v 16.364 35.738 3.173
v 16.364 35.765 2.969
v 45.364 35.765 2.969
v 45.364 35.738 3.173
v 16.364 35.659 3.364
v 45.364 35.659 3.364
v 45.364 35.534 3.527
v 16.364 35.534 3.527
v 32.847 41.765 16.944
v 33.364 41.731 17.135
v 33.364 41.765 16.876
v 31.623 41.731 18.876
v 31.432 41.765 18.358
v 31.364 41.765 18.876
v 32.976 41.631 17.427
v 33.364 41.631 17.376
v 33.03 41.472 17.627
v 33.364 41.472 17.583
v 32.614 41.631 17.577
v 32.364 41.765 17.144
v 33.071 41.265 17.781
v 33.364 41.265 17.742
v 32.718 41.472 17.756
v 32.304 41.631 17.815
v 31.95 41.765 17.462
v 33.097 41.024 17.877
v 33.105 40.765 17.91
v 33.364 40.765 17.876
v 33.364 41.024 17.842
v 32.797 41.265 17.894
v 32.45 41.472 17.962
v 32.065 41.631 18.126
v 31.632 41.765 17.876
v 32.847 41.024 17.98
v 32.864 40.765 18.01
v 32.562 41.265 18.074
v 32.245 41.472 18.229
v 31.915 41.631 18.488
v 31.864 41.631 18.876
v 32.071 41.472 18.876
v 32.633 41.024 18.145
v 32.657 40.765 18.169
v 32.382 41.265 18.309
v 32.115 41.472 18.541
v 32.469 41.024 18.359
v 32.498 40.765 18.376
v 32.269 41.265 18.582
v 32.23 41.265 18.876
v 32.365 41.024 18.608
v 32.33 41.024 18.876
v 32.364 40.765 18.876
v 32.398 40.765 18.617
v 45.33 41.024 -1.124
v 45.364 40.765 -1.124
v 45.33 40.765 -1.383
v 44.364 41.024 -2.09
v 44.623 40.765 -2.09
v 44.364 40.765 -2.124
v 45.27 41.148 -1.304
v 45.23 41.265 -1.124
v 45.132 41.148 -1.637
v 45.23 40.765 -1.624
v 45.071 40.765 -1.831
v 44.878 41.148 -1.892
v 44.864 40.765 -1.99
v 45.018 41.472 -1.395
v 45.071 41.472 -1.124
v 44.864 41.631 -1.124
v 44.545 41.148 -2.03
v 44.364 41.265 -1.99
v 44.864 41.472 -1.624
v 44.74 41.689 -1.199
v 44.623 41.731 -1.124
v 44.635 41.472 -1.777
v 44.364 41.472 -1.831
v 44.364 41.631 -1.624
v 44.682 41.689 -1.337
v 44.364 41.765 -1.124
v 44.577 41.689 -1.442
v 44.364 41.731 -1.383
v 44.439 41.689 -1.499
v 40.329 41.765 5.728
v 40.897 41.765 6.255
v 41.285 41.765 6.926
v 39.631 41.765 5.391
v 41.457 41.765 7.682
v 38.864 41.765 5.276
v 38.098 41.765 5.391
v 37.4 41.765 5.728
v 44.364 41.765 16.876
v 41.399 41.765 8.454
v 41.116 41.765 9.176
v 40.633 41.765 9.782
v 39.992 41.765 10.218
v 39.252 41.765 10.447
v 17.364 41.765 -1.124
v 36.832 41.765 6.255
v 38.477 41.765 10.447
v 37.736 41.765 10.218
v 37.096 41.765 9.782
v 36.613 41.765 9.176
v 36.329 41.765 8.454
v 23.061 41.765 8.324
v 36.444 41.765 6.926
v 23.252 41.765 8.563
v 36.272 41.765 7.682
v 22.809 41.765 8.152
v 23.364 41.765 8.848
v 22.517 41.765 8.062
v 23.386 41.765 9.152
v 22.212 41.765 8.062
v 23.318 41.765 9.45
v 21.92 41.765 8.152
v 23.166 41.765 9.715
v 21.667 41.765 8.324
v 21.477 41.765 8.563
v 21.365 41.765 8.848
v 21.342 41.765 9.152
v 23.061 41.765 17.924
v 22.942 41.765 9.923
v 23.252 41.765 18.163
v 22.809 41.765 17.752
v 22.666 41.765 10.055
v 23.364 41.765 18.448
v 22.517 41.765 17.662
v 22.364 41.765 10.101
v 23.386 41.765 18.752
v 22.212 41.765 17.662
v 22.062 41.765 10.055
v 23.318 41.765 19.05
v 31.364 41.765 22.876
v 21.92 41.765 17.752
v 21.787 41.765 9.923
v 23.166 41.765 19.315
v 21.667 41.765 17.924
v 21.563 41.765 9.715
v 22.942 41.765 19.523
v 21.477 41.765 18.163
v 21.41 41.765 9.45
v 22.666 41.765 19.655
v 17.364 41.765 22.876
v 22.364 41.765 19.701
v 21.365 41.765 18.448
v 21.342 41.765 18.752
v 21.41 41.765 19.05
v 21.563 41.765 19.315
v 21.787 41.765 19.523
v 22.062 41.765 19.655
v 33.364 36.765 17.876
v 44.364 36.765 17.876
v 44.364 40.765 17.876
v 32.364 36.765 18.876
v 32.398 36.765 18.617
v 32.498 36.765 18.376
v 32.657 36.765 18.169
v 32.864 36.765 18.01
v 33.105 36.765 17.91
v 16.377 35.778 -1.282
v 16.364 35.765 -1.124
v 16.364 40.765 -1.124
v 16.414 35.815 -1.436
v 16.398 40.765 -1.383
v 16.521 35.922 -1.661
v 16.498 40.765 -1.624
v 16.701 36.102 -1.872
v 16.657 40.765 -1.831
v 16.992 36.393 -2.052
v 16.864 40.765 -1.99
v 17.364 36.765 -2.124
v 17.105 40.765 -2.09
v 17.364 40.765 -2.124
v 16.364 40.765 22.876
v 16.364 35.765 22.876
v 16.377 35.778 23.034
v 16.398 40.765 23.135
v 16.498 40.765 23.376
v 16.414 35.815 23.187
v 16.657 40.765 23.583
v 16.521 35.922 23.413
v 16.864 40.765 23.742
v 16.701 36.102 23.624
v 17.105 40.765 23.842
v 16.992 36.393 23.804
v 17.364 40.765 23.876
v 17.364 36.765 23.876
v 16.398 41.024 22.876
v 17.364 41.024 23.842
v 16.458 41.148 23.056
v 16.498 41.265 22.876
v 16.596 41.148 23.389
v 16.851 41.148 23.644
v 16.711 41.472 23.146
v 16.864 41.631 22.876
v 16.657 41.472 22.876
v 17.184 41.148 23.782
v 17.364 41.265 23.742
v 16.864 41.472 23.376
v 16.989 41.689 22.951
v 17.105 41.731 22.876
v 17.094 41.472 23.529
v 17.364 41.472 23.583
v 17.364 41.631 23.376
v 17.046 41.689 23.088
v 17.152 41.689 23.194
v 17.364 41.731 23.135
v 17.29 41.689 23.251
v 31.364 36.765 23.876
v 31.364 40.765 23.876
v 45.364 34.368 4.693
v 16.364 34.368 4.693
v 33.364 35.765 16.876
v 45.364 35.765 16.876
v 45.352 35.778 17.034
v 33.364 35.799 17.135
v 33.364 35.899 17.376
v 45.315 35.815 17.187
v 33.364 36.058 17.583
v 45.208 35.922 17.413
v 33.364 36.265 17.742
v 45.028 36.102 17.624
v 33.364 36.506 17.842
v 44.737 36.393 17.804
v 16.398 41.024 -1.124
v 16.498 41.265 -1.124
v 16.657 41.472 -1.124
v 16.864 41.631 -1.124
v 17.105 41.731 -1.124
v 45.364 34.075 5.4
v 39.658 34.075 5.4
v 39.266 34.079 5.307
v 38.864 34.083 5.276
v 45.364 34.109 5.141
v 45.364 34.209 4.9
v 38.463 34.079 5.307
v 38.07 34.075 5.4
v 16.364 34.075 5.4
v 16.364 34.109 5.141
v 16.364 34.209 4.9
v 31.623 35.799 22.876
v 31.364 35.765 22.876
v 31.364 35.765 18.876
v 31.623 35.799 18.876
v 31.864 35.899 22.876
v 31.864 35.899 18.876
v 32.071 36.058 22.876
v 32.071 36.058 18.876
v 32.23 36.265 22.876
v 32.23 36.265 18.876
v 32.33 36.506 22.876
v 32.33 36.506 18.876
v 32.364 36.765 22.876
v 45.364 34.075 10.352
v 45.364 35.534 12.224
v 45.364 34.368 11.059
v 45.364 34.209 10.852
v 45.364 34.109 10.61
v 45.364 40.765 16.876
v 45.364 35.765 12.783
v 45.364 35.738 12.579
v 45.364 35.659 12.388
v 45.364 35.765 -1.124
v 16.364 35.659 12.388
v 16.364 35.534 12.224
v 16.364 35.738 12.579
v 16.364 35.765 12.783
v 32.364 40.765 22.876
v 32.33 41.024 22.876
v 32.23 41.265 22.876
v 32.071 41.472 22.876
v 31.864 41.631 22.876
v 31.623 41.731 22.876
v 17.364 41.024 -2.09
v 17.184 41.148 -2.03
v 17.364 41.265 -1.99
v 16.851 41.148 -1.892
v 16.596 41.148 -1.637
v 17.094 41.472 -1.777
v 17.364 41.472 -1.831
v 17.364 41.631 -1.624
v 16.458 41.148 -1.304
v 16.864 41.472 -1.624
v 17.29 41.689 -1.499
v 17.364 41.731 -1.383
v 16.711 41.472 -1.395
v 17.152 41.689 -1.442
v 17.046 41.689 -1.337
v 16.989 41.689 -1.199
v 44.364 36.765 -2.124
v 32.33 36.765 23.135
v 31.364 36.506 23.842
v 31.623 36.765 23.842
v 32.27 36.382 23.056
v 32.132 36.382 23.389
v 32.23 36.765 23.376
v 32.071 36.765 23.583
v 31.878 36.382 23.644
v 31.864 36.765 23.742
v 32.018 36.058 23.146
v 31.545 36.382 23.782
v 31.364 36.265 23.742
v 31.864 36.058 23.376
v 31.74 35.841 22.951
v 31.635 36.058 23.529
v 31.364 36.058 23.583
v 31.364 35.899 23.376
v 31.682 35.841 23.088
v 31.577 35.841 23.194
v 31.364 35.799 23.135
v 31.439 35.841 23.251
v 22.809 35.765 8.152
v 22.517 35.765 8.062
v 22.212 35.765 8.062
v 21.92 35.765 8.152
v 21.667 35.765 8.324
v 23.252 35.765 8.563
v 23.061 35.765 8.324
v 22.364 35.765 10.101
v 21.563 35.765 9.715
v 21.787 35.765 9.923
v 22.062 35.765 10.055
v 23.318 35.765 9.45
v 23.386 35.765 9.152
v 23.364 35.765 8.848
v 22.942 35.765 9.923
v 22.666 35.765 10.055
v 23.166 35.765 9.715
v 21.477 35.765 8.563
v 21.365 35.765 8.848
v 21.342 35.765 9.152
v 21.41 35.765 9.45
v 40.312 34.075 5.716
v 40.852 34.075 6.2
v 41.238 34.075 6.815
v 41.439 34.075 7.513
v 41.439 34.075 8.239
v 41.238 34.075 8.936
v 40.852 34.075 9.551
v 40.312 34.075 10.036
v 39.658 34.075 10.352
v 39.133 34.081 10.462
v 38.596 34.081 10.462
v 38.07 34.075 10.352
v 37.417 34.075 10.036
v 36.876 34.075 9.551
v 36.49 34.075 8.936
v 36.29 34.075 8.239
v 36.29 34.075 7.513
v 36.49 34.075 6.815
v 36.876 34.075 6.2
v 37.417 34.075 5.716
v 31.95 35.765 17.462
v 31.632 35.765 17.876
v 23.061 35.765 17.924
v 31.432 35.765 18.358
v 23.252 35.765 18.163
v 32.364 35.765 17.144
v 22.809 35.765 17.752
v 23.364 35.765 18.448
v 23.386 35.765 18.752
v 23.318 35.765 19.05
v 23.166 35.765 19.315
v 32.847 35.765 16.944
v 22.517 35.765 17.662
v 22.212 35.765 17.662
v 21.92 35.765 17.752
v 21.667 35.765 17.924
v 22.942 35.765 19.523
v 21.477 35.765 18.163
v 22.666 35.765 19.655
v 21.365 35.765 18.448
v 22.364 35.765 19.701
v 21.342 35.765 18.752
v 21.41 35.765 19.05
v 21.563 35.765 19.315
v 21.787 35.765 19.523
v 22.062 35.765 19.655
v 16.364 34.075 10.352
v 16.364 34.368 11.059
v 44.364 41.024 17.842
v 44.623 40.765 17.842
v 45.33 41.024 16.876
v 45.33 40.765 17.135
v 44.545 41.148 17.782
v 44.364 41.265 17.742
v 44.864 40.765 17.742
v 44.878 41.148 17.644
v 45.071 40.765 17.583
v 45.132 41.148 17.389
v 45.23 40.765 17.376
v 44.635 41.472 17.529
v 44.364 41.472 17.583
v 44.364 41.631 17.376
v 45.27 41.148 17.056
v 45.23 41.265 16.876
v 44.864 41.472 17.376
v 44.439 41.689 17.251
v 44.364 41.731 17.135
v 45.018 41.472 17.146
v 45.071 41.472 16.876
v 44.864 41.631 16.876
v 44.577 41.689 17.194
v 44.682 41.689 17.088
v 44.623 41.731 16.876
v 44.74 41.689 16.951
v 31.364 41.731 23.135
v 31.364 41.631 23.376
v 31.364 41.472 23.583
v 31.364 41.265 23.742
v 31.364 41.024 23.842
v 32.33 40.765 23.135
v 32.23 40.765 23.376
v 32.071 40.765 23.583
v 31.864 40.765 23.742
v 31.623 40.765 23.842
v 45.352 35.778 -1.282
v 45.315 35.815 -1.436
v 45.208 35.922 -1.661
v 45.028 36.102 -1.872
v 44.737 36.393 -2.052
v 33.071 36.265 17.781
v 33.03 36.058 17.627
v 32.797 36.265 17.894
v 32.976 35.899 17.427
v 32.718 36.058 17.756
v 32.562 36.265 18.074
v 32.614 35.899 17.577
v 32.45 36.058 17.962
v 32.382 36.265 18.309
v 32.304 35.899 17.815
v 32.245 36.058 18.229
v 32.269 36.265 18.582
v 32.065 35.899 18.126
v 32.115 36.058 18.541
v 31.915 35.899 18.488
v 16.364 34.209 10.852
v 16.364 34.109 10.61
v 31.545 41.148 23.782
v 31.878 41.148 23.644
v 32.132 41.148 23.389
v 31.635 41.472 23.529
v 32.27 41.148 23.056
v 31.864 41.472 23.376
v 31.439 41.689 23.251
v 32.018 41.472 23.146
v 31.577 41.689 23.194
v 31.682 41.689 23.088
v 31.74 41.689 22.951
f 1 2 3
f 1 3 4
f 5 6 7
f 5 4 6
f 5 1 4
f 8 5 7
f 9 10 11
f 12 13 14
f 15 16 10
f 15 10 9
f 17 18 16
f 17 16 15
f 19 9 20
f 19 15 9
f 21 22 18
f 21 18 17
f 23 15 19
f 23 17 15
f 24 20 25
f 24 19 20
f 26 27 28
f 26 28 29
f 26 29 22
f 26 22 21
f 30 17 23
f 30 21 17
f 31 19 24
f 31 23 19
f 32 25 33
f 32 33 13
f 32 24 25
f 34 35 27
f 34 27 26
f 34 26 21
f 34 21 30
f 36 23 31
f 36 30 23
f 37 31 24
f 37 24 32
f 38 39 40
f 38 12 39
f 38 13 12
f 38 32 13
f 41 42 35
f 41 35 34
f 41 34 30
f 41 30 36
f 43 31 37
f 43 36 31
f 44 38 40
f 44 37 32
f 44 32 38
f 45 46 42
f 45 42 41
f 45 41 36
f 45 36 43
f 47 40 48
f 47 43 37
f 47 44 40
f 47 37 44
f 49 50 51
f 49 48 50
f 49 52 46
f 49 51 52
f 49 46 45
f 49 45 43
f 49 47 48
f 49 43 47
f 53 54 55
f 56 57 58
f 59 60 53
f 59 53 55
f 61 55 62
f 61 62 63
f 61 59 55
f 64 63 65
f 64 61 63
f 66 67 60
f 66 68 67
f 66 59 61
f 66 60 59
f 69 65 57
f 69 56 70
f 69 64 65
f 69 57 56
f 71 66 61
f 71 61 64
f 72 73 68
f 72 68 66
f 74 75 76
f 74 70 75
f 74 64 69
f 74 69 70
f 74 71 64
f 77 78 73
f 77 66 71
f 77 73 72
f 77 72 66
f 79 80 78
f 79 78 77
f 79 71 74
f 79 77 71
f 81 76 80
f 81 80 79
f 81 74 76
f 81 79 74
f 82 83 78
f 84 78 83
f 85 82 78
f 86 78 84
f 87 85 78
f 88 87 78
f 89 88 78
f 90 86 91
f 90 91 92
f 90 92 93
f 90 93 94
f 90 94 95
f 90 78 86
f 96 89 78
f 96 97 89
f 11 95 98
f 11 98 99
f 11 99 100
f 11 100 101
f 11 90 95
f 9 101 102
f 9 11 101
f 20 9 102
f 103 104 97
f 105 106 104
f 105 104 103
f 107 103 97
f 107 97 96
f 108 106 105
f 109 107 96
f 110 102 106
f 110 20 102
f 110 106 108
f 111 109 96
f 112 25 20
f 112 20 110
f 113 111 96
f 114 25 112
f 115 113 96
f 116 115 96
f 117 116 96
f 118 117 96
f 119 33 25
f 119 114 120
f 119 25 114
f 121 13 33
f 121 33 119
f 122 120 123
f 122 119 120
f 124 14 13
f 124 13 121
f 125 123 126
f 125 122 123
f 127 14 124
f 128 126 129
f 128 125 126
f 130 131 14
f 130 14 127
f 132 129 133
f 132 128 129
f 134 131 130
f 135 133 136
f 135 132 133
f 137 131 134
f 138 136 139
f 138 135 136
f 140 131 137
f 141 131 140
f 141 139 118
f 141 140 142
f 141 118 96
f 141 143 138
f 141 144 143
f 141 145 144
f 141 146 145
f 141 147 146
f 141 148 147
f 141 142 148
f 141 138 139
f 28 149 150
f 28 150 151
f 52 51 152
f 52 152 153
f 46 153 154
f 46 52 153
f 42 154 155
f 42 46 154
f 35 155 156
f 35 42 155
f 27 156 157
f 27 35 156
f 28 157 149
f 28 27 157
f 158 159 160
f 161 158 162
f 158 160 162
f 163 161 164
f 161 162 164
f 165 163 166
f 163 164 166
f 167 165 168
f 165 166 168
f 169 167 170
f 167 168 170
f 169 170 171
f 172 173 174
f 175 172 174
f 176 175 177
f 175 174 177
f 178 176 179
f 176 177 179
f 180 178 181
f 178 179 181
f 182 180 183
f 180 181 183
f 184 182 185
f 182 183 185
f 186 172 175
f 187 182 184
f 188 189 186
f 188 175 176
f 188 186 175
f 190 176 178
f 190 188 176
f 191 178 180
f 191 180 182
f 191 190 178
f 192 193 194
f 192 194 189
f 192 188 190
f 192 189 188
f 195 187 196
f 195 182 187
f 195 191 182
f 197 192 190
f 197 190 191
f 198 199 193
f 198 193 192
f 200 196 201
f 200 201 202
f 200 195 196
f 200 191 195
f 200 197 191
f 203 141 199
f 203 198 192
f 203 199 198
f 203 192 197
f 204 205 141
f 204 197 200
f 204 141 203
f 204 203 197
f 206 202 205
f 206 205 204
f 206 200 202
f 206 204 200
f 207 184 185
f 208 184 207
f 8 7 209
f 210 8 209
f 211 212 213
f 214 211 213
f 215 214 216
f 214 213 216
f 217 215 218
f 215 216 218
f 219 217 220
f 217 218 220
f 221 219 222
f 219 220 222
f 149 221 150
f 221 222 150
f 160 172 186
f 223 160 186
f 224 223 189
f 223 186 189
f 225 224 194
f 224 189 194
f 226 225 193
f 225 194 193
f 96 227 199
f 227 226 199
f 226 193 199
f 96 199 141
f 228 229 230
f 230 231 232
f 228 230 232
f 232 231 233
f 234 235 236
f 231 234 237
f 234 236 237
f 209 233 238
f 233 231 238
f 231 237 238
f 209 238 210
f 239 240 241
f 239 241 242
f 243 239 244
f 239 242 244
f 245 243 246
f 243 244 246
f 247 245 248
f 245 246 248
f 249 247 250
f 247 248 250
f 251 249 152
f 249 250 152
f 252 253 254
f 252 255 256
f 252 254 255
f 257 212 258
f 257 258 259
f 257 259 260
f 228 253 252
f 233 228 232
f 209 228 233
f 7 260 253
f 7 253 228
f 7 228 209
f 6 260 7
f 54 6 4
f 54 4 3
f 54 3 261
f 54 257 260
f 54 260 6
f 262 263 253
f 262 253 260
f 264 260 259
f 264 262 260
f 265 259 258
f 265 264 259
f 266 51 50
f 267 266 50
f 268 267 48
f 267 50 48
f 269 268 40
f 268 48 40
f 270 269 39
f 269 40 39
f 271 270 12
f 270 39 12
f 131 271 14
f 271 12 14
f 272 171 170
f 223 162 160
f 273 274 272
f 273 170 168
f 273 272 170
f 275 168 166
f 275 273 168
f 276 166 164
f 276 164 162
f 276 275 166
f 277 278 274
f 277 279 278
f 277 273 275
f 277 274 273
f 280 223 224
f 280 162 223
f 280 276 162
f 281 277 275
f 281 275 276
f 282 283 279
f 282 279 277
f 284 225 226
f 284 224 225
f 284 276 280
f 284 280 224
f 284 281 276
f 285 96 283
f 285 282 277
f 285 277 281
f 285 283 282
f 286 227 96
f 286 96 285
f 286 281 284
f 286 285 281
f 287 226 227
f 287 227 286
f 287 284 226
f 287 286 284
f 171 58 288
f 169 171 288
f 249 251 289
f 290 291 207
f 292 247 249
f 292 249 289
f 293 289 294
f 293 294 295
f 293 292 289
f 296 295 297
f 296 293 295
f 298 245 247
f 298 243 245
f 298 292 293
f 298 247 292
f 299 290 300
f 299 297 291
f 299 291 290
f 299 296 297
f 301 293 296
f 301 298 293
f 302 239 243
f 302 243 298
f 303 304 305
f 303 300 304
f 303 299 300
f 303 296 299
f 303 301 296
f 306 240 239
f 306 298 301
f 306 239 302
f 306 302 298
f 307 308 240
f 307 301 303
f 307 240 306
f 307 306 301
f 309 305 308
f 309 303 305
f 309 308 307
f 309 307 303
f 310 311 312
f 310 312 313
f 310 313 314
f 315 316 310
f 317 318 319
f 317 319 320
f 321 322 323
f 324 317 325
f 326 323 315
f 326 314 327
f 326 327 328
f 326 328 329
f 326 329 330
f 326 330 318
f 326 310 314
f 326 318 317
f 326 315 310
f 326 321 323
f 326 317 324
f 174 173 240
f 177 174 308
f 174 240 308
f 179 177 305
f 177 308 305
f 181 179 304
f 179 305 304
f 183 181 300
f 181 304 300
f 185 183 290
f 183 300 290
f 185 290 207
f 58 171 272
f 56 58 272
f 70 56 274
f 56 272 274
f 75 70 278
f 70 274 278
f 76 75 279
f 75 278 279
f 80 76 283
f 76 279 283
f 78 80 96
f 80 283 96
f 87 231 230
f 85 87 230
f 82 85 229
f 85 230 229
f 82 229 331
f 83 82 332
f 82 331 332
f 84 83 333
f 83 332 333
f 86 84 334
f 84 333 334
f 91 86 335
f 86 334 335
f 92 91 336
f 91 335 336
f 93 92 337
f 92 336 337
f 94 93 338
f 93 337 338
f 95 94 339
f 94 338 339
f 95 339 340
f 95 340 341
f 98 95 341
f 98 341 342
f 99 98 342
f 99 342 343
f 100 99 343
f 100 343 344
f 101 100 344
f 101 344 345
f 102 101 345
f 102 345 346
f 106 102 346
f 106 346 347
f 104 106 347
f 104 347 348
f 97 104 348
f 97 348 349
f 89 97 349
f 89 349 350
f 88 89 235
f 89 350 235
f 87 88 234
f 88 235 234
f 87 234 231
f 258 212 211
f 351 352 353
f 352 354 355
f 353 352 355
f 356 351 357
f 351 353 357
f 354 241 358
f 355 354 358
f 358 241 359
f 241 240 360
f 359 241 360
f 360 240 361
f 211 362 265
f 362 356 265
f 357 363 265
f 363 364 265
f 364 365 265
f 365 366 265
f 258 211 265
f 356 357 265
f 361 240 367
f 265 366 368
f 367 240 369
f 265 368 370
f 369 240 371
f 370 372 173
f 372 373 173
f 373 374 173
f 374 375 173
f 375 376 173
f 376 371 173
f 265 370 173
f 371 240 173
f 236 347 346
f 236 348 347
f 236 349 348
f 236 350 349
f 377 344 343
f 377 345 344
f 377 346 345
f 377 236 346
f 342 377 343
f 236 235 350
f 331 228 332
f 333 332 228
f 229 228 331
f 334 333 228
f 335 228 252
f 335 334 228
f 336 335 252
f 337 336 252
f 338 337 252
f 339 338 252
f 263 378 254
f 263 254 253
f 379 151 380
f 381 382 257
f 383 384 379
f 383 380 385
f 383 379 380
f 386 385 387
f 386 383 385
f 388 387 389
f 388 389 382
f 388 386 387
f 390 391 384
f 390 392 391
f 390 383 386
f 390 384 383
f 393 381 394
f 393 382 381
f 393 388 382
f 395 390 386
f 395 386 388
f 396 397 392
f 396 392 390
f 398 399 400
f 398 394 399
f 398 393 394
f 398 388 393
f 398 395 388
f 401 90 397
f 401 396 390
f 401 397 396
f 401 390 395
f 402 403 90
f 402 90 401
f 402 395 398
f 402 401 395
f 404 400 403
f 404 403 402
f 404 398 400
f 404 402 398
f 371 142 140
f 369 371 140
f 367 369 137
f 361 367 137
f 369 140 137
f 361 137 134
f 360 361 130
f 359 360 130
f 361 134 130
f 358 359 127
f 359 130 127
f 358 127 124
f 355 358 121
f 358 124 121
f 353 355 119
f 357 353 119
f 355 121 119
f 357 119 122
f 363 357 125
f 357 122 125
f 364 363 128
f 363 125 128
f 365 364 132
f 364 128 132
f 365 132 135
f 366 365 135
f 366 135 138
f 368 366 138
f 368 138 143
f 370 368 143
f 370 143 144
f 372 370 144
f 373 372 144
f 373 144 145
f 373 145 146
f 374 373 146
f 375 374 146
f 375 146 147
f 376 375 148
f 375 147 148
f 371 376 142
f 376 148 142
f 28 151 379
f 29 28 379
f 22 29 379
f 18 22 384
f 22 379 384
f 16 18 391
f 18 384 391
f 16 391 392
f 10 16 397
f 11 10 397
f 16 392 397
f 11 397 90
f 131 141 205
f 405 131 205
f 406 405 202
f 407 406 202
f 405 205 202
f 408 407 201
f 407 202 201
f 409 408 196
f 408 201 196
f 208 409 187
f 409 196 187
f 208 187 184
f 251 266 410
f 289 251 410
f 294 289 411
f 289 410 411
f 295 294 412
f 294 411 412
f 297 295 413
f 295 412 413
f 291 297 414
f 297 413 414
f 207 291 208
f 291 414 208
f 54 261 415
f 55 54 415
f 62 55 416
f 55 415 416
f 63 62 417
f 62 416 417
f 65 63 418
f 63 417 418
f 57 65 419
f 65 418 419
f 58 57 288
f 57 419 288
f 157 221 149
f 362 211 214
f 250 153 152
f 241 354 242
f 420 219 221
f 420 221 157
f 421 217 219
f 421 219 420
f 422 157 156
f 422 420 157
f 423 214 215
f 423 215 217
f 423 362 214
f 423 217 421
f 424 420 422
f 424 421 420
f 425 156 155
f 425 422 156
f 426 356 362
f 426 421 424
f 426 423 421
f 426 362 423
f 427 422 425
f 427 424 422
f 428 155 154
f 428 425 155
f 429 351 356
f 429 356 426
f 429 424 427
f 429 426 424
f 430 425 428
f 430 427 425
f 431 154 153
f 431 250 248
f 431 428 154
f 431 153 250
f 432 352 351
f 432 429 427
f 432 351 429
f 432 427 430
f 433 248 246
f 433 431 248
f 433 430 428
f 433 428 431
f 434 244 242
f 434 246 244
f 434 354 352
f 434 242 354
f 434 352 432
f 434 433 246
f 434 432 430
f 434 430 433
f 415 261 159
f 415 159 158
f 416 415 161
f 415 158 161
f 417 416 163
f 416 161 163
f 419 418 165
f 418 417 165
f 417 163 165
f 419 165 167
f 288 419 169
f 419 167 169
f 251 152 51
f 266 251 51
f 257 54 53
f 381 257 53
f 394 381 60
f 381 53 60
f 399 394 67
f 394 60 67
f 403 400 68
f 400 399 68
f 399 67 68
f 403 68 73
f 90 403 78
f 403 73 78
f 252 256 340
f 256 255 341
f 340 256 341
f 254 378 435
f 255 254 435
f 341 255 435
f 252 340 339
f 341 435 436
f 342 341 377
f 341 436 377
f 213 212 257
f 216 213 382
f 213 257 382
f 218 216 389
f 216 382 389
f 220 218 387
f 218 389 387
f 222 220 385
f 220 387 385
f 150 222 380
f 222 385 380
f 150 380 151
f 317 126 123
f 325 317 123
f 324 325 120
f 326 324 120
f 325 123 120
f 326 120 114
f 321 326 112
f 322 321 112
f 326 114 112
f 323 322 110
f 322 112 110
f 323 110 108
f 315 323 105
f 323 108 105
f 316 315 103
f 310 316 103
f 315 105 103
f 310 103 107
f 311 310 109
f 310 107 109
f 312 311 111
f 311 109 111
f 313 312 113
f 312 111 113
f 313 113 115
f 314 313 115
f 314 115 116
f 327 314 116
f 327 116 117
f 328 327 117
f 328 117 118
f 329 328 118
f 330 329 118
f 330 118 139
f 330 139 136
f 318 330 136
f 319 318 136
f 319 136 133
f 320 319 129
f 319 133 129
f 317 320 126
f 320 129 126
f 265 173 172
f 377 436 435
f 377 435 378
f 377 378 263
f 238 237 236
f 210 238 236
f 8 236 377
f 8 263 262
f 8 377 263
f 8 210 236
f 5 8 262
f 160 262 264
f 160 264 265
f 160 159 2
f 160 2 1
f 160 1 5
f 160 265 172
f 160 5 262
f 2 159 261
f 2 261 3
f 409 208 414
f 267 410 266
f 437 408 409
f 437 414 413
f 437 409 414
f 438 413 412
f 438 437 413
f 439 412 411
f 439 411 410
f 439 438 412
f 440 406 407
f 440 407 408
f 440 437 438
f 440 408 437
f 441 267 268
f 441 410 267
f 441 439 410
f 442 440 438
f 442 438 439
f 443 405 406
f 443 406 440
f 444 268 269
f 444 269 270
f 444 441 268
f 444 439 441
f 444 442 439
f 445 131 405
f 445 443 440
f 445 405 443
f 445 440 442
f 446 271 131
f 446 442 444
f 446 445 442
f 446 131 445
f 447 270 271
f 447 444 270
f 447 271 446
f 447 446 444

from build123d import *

# Parameters (mm, degrees)
SKETCH1_W           = 20
SKETCH1_H           = 6
BOSS_EXTRUDE1_DEPTH = 13
CUT_EXTRUDE1_REACH  = 51.362
SKETCH2_R           = 2.6
BOSS_EXTRUDE3_START = 16
BOSS_EXTRUDE3_DEPTH = 16
SKETCH6_W           = 16
SKETCH6_H           = 6
BOSS_EXTRUDE4_DEPTH = 6
SKETCH7_R           = 1.025
CUT_EXTRUDE3_DEPTH  = 6
FILLET3_R           = 1


with BuildPart() as part:
    # Sketch1 → Boss-Extrude1 (new body)
    with BuildSketch(Plane(origin=(32.364284334, 0, 0), x_dir=(0, 0, -1), z_dir=(1, 0, 0))):
        with Locations((-7.875866483, 38.765059464)):
            Rectangle(SKETCH1_W, SKETCH1_H)
        with BuildLine():
            Line((-12.22448084, 35.533673821), (-10.765866483, 34.075059464))
            Line((-10.765866483, 34.075059464), (-4.985866483, 34.075059464))
            Line((-4.985866483, 34.075059464), (-3.527252126, 35.533673821))
            ThreePointArc((-3.527252126, 35.533673821), (-3.27095768, 35.704924294), (-2.968637768, 35.765059464))
            Line((-2.968637768, 35.765059464), (-12.783095197, 35.765059464))
            ThreePointArc((-12.783095197, 35.765059464), (-12.480775285, 35.704924294), (-12.22448084, 35.533673821))
        make_face()
    extrude(amount=BOSS_EXTRUDE1_DEPTH)

    # Sketch2 → Cut-Extrude1 (cut, up to next)
    with BuildSketch(Plane.XZ.offset(-34.075059464), mode=Mode.PRIVATE) as cut_extrude1_sk1:
        with Locations(Location((38.864284334, 7.875866483, 0), (0, 0, 270))):
            Circle(SKETCH2_R)
    cut_extrude1_tool1 = extrude(cut_extrude1_sk1.sketch, amount=-CUT_EXTRUDE1_REACH, mode=Mode.PRIVATE) & part.part
    add(cut_extrude1_tool1.solids().sort_by_distance((38.864284, 34.075059, 7.875866))[0], mode=Mode.SUBTRACT)

    # Sketch5 → Boss-Extrude3 (add)
    with BuildSketch(Plane.ZY.offset(-32.364284334).offset(BOSS_EXTRUDE3_START)):
        with BuildLine():
            Line((12.783095197, 35.765059464), (17.875866483, 35.765059464))
            Line((17.875866483, 35.765059464), (17.875866483, 41.765059464))
            Line((17.875866483, 41.765059464), (-2.124133517, 41.765059464))
            Line((-2.124133517, 41.765059464), (-2.124133517, 35.765059464))
            Line((-2.124133517, 35.765059464), (2.968637768, 35.765059464))
            ThreePointArc((2.968637768, 35.765059464), (3.27095768, 35.704924294), (3.527252126, 35.533673821))
            Line((3.527252126, 35.533673821), (4.985866483, 34.075059464))
            Line((4.985866483, 34.075059464), (10.765866483, 34.075059464))
            Line((10.765866483, 34.075059464), (12.22448084, 35.533673821))
            ThreePointArc((12.22448084, 35.533673821), (12.480775285, 35.704924294), (12.783095197, 35.765059464))
        make_face()
    extrude(amount=-BOSS_EXTRUDE3_DEPTH)

    # Sketch6 → Boss-Extrude4 (add)
    with BuildSketch(Plane.XY.offset(17.875866483)):
        with Locations((24.364284334, 38.765059464)):
            Rectangle(SKETCH6_W, SKETCH6_H)
    extrude(amount=BOSS_EXTRUDE4_DEPTH)

    # Sketch7 → Cut-Extrude3 (cut)
    with BuildSketch(Plane(origin=(0, 41.765059464, 0), x_dir=(1, 0, 0), z_dir=(0, 1, 0))):
        with Locations(Location((22.364284334, -9.075866483, 0), (0, 0, 270))):
            Circle(SKETCH7_R)
        with Locations(Location((22.364284334, -18.675866483, 0), (0, 0, 270))):
            Circle(SKETCH7_R)
    extrude(amount=-CUT_EXTRUDE3_DEPTH, mode=Mode.SUBTRACT)

    # Fillet3
    # the kernel refuses this fillet: 1 mm, written as the material it adds along each edge
    with BuildSketch(Plane(origin=(32.364284334, 41.765059464, 17.875866483), x_dir=(1, 0, 0), z_dir=(0, -1, 0))) as fillet3_piece_1:
        with BuildLine():
            CenterArc((FILLET3_R, FILLET3_R), FILLET3_R, 180, 90)
            Line((0, FILLET3_R), (0, 0))
            Line((0, 0), (FILLET3_R, 0))
        make_face()
    extrude(amount=6)
    # the kernel refuses this fillet: 1 mm, written as the material it takes off along each edge
    with BuildSketch(Plane(origin=(17.364284334, 40.765059464, 22.875866483), x_dir=(-1, 0, 0), z_dir=(0, 1, 0))) as fillet3_2_piece_1_section:
        Polygon((0, 0), (FILLET3_R, 0), (FILLET3_R, FILLET3_R), (0, FILLET3_R), align=None)
    fillet3_2_piece_1 = extrude(amount=FILLET3_R, mode=Mode.PRIVATE)
    fillet3_2_piece_1 = fillet3_2_piece_1 - Plane(origin=(17.364284334, 40.765059464, 22.875866483), x_dir=(0.7071067811865475, 0, -0.7071067811865475), z_dir=(0, 1, 0)) * Sphere(FILLET3_R, mode=Mode.PRIVATE)
    add(fillet3_2_piece_1, mode=Mode.SUBTRACT)
    with BuildSketch(Plane(origin=(17.364284334, 40.765059464, -1.124133517), x_dir=(-1, 0, 0), z_dir=(0, 1, 0))) as fillet3_2_piece_2_section:
        Polygon((0, 0), (FILLET3_R, 0), (FILLET3_R, -FILLET3_R), (0, -FILLET3_R), align=None)
    fillet3_2_piece_2 = extrude(amount=FILLET3_R, mode=Mode.PRIVATE)
    fillet3_2_piece_2 = fillet3_2_piece_2 - Plane(origin=(17.364284334, 40.765059464, -1.124133517), x_dir=(0.7071067811865475, 0, 0.7071067811865475), z_dir=(0, 1, 0)) * Sphere(FILLET3_R, mode=Mode.PRIVATE)
    add(fillet3_2_piece_2, mode=Mode.SUBTRACT)
    with BuildSketch(Plane(origin=(31.364284334, 36.765059464, 22.875866483), x_dir=(0, 0, 1), z_dir=(0, -1, 0))) as fillet3_2_piece_3_section:
        Polygon((0, 0), (FILLET3_R, 0), (FILLET3_R, -FILLET3_R), (0, -FILLET3_R), align=None)
    fillet3_2_piece_3 = extrude(amount=FILLET3_R, mode=Mode.PRIVATE)
    fillet3_2_piece_3 = fillet3_2_piece_3 - Plane(origin=(31.364284334, 36.765059464, 22.875866483), x_dir=(-0.7071067811865475, 0, -0.7071067811865475), z_dir=(0, -1, 0)) * Sphere(FILLET3_R, mode=Mode.PRIVATE)
    add(fillet3_2_piece_3, mode=Mode.SUBTRACT)
    with BuildSketch(Plane(origin=(31.364284334, 40.765059464, 22.875866483), x_dir=(0, 0, 1), z_dir=(0, 1, 0))) as fillet3_2_piece_4_section:
        Polygon((0, 0), (FILLET3_R, 0), (FILLET3_R, FILLET3_R), (0, FILLET3_R), align=None)
    fillet3_2_piece_4 = extrude(amount=FILLET3_R, mode=Mode.PRIVATE)
    fillet3_2_piece_4 = fillet3_2_piece_4 - Plane(origin=(31.364284334, 40.765059464, 22.875866483), x_dir=(-0.7071067811865475, 0, -0.7071067811865475), z_dir=(0, 1, 0)) * Sphere(FILLET3_R, mode=Mode.PRIVATE)
    add(fillet3_2_piece_4, mode=Mode.SUBTRACT)
    with BuildSketch(Plane(origin=(44.364284334, 40.765059464, 16.875866483), x_dir=(1, 0, 0), z_dir=(0, 1, 0))) as fillet3_2_piece_5_section:
        Polygon((0, 0), (FILLET3_R, 0), (FILLET3_R, -FILLET3_R), (0, -FILLET3_R), align=None)
    fillet3_2_piece_5 = extrude(amount=FILLET3_R, mode=Mode.PRIVATE)
    fillet3_2_piece_5 = fillet3_2_piece_5 - Plane(origin=(44.364284334, 40.765059464, 16.875866483), x_dir=(-0.7071067811865475, 0, -0.7071067811865475), z_dir=(0, 1, 0)) * Sphere(FILLET3_R, mode=Mode.PRIVATE)
    add(fillet3_2_piece_5, mode=Mode.SUBTRACT)
    with BuildSketch(Plane(origin=(44.364284334, 40.765059464, -1.124133517), x_dir=(0, 0, -1), z_dir=(0, 1, 0))) as fillet3_2_piece_6_section:
        Polygon((0, 0), (FILLET3_R, 0), (FILLET3_R, -FILLET3_R), (0, -FILLET3_R), align=None)
    fillet3_2_piece_6 = extrude(amount=FILLET3_R, mode=Mode.PRIVATE)
    fillet3_2_piece_6 = fillet3_2_piece_6 - Plane(origin=(44.364284334, 40.765059464, -1.124133517), x_dir=(-0.7071067811865475, 0, 0.7071067811865475), z_dir=(0, 1, 0)) * Sphere(FILLET3_R, mode=Mode.PRIVATE)
    add(fillet3_2_piece_6, mode=Mode.SUBTRACT)
    with BuildSketch(Plane(origin=(16.364284334, 41.765059464, 22.875866483), x_dir=(0, -1, 0), z_dir=(0, 0, -1))) as fillet3_2_piece_7:
        with BuildLine():
            CenterArc((FILLET3_R, -FILLET3_R), FILLET3_R, 90, 90)
            Line((0, -FILLET3_R), (0, 0))
            Line((0, 0), (FILLET3_R, 0))
        make_face()
    extrude(amount=24, mode=Mode.SUBTRACT)
    with BuildSketch(Plane(origin=(16.364284334, 40.765059464, -2.124133517), x_dir=(0, 0, 1), z_dir=(0, -1, 0)), Plane(origin=(16.364284334, 33.265059464, 23.875866483), x_dir=(0, 0, -1), z_dir=(0, 1, 0)), Plane(origin=(45.364284334, 33.265059464, -2.124133517), x_dir=(0, 0, 1), z_dir=(0, 1, 0)), Plane(origin=(45.364284334, 40.765059464, 17.875866483), x_dir=(0, 0, -1), z_dir=(0, -1, 0))) as fillet3_2_piece_8:
        with BuildLine():
            CenterArc((FILLET3_R, -FILLET3_R), FILLET3_R, 90, 90)
            Line((0, -FILLET3_R), (0, 0))
            Line((0, 0), (FILLET3_R, 0))
        make_face()
    extrude(amount=7.5, mode=Mode.SUBTRACT)
    with BuildSketch(Plane(origin=(32.364284334, 35.765059464, 18.875866483), x_dir=(-1, 0, 0), z_dir=(0, 0, 1)), Plane(origin=(32.364284334, 41.765059464, 18.875866483), x_dir=(0, -1, 0), z_dir=(0, 0, 1))) as fillet3_2_piece_9:
        with BuildLine():
            CenterArc((FILLET3_R, -FILLET3_R), FILLET3_R, 90, 90)
            Line((0, -FILLET3_R), (0, 0))
            Line((0, 0), (FILLET3_R, 0))
        make_face()
    extrude(amount=4, mode=Mode.SUBTRACT)
    with BuildSketch(Plane(origin=(31.364284334, 35.765059464, 23.875866483), x_dir=(0, 0, -1), z_dir=(-1, 0, 0))) as fillet3_2_piece_10:
        with BuildLine():
            CenterArc((FILLET3_R, -FILLET3_R), FILLET3_R, 90, 90)
            Line((0, -FILLET3_R), (0, 0))
            Line((0, 0), (FILLET3_R, 0))
        make_face()
    extrude(amount=17.5, mode=Mode.SUBTRACT)
    with BuildSketch(Plane(origin=(32.364284334, 40.765059464, 23.875866483), x_dir=(-1, 0, 0), z_dir=(0, -1, 0))) as fillet3_2_piece_11:
        with BuildLine():
            CenterArc((FILLET3_R, FILLET3_R), FILLET3_R, 180, 90)
            Line((0, FILLET3_R), (0, 0))
            Line((0, 0), (FILLET3_R, 0))
        make_face()
    extrude(amount=4, mode=Mode.SUBTRACT)
    with BuildSketch(Plane(origin=(17.364284334, 41.765059464, 23.875866483), x_dir=(0, -1, 0), z_dir=(1, 0, 0))) as fillet3_2_piece_12:
        with BuildLine():
            CenterArc((FILLET3_R, FILLET3_R), FILLET3_R, 180, 90)
            Line((0, FILLET3_R), (0, 0))
            Line((0, 0), (FILLET3_R, 0))
        make_face()
    extrude(amount=14, mode=Mode.SUBTRACT)
    with BuildSketch(Plane(origin=(47.864284334, 35.765059464, 17.875866483), x_dir=(0, 0, -1), z_dir=(-1, 0, 0))) as fillet3_2_piece_13:
        with BuildLine():
            CenterArc((FILLET3_R, -FILLET3_R), FILLET3_R, 90, 90)
            Line((0, -FILLET3_R), (0, 0))
            Line((0, 0), (FILLET3_R, 0))
        make_face()
    extrude(amount=14.5, mode=Mode.SUBTRACT)
    with BuildSketch(Plane(origin=(44.364284334, 41.765059464, 17.875866483), x_dir=(0, -1, 0), z_dir=(-1, 0, 0))) as fillet3_2_piece_14:
        with BuildLine():
            CenterArc((FILLET3_R, -FILLET3_R), FILLET3_R, 90, 90)
            Line((0, -FILLET3_R), (0, 0))
            Line((0, 0), (FILLET3_R, 0))
        make_face()
    extrude(amount=11, mode=Mode.SUBTRACT)
    with BuildSketch(Plane(origin=(17.364284334, 41.765059464, -2.124133517), x_dir=(0, 0, 1), z_dir=(1, 0, 0))) as fillet3_2_piece_15:
        with BuildLine():
            CenterArc((FILLET3_R, FILLET3_R), FILLET3_R, 180, 90)
            Line((0, FILLET3_R), (0, 0))
            Line((0, 0), (FILLET3_R, 0))
        make_face()
    extrude(amount=27, mode=Mode.SUBTRACT)
    with BuildSketch(Plane(origin=(13.864284334, 35.765059464, -2.124133517), x_dir=(0, 1, 0), z_dir=(1, 0, 0))) as fillet3_2_piece_16:
        with BuildLine():
            CenterArc((FILLET3_R, FILLET3_R), FILLET3_R, 180, 90)
            Line((0, FILLET3_R), (0, 0))
            Line((0, 0), (FILLET3_R, 0))
        make_face()
    extrude(amount=34, mode=Mode.SUBTRACT)
    with BuildSketch(Plane(origin=(15.328750428, 34.075059464, 4.985866483), x_dir=(0, 0.7071067811865497, -0.7071067811865454), z_dir=(1, 0, 0))) as fillet3_2_piece_17:
        with BuildLine():
            CenterArc((FILLET3_R * 0.414213562373, FILLET3_R), FILLET3_R, 225, 45)
            Line((-FILLET3_R * 0.292893218813, FILLET3_R * 0.292893218813), (0, 0))
            Line((0, 0), (FILLET3_R * 0.414213562373, 0))
        make_face()
    extrude(amount=31.071067812, mode=Mode.SUBTRACT)
    with BuildSketch(Plane(origin=(15.328750428, 34.075059464, 10.765866483), x_dir=(0, 0.7071067811865432, 0.7071067811865518), z_dir=(1, 0, 0))) as fillet3_2_piece_18:
        with BuildLine():
            CenterArc((FILLET3_R * 0.414213562373, -FILLET3_R), FILLET3_R, 90, 45)
            Line((-FILLET3_R * 0.292893218813, -FILLET3_R * 0.292893218813), (0, 0))
            Line((0, 0), (FILLET3_R * 0.414213562373, 0))
        make_face()
    extrude(amount=31.071067812, mode=Mode.SUBTRACT)
    with BuildSketch(Plane(origin=(45.364284334, 41.765059464, -1.124133517), x_dir=(0, -1, 0), z_dir=(0, 0, 1))) as fillet3_2_piece_19:
        with BuildLine():
            CenterArc((FILLET3_R, -FILLET3_R), FILLET3_R, 90, 90)
            Line((0, -FILLET3_R), (0, 0))
            Line((0, 0), (FILLET3_R, 0))
        make_face()
    extrude(amount=18, mode=Mode.SUBTRACT)
    with BuildSketch(Plane(origin=(33.364284334, 41.765059464, 18.875866483), x_dir=(0, 0, -1), z_dir=(1, 0, 0))) as fillet3_2_piece_20:
        with BuildLine():
            CenterArc((1 + FILLET3_R, -FILLET3_R), FILLET3_R, 90, 90)
            Line((1, -FILLET3_R), (1, 0))
            Line((1, 0), (1 + FILLET3_R, 0))
        make_face()
    revolve(axis=Axis((33.364284334, 41.765059464, 18.875866483), (0, 1, 0)), revolution_arc=90, mode=Mode.SUBTRACT)
    with BuildSketch(Plane(origin=(33.364284334, 35.765059464, 18.875866483), x_dir=(0, 0, -1), z_dir=(1, 0, 0))) as fillet3_2_piece_21:
        with BuildLine():
            CenterArc((1 + FILLET3_R, FILLET3_R), FILLET3_R, 180, 90)
            Line((1, FILLET3_R), (1, 0))
            Line((1, 0), (1 + FILLET3_R, 0))
        make_face()
    revolve(axis=Axis((33.364284334, 35.765059464, 18.875866483), (0, 1, 0)), revolution_arc=90, mode=Mode.SUBTRACT)


solid = part.part
